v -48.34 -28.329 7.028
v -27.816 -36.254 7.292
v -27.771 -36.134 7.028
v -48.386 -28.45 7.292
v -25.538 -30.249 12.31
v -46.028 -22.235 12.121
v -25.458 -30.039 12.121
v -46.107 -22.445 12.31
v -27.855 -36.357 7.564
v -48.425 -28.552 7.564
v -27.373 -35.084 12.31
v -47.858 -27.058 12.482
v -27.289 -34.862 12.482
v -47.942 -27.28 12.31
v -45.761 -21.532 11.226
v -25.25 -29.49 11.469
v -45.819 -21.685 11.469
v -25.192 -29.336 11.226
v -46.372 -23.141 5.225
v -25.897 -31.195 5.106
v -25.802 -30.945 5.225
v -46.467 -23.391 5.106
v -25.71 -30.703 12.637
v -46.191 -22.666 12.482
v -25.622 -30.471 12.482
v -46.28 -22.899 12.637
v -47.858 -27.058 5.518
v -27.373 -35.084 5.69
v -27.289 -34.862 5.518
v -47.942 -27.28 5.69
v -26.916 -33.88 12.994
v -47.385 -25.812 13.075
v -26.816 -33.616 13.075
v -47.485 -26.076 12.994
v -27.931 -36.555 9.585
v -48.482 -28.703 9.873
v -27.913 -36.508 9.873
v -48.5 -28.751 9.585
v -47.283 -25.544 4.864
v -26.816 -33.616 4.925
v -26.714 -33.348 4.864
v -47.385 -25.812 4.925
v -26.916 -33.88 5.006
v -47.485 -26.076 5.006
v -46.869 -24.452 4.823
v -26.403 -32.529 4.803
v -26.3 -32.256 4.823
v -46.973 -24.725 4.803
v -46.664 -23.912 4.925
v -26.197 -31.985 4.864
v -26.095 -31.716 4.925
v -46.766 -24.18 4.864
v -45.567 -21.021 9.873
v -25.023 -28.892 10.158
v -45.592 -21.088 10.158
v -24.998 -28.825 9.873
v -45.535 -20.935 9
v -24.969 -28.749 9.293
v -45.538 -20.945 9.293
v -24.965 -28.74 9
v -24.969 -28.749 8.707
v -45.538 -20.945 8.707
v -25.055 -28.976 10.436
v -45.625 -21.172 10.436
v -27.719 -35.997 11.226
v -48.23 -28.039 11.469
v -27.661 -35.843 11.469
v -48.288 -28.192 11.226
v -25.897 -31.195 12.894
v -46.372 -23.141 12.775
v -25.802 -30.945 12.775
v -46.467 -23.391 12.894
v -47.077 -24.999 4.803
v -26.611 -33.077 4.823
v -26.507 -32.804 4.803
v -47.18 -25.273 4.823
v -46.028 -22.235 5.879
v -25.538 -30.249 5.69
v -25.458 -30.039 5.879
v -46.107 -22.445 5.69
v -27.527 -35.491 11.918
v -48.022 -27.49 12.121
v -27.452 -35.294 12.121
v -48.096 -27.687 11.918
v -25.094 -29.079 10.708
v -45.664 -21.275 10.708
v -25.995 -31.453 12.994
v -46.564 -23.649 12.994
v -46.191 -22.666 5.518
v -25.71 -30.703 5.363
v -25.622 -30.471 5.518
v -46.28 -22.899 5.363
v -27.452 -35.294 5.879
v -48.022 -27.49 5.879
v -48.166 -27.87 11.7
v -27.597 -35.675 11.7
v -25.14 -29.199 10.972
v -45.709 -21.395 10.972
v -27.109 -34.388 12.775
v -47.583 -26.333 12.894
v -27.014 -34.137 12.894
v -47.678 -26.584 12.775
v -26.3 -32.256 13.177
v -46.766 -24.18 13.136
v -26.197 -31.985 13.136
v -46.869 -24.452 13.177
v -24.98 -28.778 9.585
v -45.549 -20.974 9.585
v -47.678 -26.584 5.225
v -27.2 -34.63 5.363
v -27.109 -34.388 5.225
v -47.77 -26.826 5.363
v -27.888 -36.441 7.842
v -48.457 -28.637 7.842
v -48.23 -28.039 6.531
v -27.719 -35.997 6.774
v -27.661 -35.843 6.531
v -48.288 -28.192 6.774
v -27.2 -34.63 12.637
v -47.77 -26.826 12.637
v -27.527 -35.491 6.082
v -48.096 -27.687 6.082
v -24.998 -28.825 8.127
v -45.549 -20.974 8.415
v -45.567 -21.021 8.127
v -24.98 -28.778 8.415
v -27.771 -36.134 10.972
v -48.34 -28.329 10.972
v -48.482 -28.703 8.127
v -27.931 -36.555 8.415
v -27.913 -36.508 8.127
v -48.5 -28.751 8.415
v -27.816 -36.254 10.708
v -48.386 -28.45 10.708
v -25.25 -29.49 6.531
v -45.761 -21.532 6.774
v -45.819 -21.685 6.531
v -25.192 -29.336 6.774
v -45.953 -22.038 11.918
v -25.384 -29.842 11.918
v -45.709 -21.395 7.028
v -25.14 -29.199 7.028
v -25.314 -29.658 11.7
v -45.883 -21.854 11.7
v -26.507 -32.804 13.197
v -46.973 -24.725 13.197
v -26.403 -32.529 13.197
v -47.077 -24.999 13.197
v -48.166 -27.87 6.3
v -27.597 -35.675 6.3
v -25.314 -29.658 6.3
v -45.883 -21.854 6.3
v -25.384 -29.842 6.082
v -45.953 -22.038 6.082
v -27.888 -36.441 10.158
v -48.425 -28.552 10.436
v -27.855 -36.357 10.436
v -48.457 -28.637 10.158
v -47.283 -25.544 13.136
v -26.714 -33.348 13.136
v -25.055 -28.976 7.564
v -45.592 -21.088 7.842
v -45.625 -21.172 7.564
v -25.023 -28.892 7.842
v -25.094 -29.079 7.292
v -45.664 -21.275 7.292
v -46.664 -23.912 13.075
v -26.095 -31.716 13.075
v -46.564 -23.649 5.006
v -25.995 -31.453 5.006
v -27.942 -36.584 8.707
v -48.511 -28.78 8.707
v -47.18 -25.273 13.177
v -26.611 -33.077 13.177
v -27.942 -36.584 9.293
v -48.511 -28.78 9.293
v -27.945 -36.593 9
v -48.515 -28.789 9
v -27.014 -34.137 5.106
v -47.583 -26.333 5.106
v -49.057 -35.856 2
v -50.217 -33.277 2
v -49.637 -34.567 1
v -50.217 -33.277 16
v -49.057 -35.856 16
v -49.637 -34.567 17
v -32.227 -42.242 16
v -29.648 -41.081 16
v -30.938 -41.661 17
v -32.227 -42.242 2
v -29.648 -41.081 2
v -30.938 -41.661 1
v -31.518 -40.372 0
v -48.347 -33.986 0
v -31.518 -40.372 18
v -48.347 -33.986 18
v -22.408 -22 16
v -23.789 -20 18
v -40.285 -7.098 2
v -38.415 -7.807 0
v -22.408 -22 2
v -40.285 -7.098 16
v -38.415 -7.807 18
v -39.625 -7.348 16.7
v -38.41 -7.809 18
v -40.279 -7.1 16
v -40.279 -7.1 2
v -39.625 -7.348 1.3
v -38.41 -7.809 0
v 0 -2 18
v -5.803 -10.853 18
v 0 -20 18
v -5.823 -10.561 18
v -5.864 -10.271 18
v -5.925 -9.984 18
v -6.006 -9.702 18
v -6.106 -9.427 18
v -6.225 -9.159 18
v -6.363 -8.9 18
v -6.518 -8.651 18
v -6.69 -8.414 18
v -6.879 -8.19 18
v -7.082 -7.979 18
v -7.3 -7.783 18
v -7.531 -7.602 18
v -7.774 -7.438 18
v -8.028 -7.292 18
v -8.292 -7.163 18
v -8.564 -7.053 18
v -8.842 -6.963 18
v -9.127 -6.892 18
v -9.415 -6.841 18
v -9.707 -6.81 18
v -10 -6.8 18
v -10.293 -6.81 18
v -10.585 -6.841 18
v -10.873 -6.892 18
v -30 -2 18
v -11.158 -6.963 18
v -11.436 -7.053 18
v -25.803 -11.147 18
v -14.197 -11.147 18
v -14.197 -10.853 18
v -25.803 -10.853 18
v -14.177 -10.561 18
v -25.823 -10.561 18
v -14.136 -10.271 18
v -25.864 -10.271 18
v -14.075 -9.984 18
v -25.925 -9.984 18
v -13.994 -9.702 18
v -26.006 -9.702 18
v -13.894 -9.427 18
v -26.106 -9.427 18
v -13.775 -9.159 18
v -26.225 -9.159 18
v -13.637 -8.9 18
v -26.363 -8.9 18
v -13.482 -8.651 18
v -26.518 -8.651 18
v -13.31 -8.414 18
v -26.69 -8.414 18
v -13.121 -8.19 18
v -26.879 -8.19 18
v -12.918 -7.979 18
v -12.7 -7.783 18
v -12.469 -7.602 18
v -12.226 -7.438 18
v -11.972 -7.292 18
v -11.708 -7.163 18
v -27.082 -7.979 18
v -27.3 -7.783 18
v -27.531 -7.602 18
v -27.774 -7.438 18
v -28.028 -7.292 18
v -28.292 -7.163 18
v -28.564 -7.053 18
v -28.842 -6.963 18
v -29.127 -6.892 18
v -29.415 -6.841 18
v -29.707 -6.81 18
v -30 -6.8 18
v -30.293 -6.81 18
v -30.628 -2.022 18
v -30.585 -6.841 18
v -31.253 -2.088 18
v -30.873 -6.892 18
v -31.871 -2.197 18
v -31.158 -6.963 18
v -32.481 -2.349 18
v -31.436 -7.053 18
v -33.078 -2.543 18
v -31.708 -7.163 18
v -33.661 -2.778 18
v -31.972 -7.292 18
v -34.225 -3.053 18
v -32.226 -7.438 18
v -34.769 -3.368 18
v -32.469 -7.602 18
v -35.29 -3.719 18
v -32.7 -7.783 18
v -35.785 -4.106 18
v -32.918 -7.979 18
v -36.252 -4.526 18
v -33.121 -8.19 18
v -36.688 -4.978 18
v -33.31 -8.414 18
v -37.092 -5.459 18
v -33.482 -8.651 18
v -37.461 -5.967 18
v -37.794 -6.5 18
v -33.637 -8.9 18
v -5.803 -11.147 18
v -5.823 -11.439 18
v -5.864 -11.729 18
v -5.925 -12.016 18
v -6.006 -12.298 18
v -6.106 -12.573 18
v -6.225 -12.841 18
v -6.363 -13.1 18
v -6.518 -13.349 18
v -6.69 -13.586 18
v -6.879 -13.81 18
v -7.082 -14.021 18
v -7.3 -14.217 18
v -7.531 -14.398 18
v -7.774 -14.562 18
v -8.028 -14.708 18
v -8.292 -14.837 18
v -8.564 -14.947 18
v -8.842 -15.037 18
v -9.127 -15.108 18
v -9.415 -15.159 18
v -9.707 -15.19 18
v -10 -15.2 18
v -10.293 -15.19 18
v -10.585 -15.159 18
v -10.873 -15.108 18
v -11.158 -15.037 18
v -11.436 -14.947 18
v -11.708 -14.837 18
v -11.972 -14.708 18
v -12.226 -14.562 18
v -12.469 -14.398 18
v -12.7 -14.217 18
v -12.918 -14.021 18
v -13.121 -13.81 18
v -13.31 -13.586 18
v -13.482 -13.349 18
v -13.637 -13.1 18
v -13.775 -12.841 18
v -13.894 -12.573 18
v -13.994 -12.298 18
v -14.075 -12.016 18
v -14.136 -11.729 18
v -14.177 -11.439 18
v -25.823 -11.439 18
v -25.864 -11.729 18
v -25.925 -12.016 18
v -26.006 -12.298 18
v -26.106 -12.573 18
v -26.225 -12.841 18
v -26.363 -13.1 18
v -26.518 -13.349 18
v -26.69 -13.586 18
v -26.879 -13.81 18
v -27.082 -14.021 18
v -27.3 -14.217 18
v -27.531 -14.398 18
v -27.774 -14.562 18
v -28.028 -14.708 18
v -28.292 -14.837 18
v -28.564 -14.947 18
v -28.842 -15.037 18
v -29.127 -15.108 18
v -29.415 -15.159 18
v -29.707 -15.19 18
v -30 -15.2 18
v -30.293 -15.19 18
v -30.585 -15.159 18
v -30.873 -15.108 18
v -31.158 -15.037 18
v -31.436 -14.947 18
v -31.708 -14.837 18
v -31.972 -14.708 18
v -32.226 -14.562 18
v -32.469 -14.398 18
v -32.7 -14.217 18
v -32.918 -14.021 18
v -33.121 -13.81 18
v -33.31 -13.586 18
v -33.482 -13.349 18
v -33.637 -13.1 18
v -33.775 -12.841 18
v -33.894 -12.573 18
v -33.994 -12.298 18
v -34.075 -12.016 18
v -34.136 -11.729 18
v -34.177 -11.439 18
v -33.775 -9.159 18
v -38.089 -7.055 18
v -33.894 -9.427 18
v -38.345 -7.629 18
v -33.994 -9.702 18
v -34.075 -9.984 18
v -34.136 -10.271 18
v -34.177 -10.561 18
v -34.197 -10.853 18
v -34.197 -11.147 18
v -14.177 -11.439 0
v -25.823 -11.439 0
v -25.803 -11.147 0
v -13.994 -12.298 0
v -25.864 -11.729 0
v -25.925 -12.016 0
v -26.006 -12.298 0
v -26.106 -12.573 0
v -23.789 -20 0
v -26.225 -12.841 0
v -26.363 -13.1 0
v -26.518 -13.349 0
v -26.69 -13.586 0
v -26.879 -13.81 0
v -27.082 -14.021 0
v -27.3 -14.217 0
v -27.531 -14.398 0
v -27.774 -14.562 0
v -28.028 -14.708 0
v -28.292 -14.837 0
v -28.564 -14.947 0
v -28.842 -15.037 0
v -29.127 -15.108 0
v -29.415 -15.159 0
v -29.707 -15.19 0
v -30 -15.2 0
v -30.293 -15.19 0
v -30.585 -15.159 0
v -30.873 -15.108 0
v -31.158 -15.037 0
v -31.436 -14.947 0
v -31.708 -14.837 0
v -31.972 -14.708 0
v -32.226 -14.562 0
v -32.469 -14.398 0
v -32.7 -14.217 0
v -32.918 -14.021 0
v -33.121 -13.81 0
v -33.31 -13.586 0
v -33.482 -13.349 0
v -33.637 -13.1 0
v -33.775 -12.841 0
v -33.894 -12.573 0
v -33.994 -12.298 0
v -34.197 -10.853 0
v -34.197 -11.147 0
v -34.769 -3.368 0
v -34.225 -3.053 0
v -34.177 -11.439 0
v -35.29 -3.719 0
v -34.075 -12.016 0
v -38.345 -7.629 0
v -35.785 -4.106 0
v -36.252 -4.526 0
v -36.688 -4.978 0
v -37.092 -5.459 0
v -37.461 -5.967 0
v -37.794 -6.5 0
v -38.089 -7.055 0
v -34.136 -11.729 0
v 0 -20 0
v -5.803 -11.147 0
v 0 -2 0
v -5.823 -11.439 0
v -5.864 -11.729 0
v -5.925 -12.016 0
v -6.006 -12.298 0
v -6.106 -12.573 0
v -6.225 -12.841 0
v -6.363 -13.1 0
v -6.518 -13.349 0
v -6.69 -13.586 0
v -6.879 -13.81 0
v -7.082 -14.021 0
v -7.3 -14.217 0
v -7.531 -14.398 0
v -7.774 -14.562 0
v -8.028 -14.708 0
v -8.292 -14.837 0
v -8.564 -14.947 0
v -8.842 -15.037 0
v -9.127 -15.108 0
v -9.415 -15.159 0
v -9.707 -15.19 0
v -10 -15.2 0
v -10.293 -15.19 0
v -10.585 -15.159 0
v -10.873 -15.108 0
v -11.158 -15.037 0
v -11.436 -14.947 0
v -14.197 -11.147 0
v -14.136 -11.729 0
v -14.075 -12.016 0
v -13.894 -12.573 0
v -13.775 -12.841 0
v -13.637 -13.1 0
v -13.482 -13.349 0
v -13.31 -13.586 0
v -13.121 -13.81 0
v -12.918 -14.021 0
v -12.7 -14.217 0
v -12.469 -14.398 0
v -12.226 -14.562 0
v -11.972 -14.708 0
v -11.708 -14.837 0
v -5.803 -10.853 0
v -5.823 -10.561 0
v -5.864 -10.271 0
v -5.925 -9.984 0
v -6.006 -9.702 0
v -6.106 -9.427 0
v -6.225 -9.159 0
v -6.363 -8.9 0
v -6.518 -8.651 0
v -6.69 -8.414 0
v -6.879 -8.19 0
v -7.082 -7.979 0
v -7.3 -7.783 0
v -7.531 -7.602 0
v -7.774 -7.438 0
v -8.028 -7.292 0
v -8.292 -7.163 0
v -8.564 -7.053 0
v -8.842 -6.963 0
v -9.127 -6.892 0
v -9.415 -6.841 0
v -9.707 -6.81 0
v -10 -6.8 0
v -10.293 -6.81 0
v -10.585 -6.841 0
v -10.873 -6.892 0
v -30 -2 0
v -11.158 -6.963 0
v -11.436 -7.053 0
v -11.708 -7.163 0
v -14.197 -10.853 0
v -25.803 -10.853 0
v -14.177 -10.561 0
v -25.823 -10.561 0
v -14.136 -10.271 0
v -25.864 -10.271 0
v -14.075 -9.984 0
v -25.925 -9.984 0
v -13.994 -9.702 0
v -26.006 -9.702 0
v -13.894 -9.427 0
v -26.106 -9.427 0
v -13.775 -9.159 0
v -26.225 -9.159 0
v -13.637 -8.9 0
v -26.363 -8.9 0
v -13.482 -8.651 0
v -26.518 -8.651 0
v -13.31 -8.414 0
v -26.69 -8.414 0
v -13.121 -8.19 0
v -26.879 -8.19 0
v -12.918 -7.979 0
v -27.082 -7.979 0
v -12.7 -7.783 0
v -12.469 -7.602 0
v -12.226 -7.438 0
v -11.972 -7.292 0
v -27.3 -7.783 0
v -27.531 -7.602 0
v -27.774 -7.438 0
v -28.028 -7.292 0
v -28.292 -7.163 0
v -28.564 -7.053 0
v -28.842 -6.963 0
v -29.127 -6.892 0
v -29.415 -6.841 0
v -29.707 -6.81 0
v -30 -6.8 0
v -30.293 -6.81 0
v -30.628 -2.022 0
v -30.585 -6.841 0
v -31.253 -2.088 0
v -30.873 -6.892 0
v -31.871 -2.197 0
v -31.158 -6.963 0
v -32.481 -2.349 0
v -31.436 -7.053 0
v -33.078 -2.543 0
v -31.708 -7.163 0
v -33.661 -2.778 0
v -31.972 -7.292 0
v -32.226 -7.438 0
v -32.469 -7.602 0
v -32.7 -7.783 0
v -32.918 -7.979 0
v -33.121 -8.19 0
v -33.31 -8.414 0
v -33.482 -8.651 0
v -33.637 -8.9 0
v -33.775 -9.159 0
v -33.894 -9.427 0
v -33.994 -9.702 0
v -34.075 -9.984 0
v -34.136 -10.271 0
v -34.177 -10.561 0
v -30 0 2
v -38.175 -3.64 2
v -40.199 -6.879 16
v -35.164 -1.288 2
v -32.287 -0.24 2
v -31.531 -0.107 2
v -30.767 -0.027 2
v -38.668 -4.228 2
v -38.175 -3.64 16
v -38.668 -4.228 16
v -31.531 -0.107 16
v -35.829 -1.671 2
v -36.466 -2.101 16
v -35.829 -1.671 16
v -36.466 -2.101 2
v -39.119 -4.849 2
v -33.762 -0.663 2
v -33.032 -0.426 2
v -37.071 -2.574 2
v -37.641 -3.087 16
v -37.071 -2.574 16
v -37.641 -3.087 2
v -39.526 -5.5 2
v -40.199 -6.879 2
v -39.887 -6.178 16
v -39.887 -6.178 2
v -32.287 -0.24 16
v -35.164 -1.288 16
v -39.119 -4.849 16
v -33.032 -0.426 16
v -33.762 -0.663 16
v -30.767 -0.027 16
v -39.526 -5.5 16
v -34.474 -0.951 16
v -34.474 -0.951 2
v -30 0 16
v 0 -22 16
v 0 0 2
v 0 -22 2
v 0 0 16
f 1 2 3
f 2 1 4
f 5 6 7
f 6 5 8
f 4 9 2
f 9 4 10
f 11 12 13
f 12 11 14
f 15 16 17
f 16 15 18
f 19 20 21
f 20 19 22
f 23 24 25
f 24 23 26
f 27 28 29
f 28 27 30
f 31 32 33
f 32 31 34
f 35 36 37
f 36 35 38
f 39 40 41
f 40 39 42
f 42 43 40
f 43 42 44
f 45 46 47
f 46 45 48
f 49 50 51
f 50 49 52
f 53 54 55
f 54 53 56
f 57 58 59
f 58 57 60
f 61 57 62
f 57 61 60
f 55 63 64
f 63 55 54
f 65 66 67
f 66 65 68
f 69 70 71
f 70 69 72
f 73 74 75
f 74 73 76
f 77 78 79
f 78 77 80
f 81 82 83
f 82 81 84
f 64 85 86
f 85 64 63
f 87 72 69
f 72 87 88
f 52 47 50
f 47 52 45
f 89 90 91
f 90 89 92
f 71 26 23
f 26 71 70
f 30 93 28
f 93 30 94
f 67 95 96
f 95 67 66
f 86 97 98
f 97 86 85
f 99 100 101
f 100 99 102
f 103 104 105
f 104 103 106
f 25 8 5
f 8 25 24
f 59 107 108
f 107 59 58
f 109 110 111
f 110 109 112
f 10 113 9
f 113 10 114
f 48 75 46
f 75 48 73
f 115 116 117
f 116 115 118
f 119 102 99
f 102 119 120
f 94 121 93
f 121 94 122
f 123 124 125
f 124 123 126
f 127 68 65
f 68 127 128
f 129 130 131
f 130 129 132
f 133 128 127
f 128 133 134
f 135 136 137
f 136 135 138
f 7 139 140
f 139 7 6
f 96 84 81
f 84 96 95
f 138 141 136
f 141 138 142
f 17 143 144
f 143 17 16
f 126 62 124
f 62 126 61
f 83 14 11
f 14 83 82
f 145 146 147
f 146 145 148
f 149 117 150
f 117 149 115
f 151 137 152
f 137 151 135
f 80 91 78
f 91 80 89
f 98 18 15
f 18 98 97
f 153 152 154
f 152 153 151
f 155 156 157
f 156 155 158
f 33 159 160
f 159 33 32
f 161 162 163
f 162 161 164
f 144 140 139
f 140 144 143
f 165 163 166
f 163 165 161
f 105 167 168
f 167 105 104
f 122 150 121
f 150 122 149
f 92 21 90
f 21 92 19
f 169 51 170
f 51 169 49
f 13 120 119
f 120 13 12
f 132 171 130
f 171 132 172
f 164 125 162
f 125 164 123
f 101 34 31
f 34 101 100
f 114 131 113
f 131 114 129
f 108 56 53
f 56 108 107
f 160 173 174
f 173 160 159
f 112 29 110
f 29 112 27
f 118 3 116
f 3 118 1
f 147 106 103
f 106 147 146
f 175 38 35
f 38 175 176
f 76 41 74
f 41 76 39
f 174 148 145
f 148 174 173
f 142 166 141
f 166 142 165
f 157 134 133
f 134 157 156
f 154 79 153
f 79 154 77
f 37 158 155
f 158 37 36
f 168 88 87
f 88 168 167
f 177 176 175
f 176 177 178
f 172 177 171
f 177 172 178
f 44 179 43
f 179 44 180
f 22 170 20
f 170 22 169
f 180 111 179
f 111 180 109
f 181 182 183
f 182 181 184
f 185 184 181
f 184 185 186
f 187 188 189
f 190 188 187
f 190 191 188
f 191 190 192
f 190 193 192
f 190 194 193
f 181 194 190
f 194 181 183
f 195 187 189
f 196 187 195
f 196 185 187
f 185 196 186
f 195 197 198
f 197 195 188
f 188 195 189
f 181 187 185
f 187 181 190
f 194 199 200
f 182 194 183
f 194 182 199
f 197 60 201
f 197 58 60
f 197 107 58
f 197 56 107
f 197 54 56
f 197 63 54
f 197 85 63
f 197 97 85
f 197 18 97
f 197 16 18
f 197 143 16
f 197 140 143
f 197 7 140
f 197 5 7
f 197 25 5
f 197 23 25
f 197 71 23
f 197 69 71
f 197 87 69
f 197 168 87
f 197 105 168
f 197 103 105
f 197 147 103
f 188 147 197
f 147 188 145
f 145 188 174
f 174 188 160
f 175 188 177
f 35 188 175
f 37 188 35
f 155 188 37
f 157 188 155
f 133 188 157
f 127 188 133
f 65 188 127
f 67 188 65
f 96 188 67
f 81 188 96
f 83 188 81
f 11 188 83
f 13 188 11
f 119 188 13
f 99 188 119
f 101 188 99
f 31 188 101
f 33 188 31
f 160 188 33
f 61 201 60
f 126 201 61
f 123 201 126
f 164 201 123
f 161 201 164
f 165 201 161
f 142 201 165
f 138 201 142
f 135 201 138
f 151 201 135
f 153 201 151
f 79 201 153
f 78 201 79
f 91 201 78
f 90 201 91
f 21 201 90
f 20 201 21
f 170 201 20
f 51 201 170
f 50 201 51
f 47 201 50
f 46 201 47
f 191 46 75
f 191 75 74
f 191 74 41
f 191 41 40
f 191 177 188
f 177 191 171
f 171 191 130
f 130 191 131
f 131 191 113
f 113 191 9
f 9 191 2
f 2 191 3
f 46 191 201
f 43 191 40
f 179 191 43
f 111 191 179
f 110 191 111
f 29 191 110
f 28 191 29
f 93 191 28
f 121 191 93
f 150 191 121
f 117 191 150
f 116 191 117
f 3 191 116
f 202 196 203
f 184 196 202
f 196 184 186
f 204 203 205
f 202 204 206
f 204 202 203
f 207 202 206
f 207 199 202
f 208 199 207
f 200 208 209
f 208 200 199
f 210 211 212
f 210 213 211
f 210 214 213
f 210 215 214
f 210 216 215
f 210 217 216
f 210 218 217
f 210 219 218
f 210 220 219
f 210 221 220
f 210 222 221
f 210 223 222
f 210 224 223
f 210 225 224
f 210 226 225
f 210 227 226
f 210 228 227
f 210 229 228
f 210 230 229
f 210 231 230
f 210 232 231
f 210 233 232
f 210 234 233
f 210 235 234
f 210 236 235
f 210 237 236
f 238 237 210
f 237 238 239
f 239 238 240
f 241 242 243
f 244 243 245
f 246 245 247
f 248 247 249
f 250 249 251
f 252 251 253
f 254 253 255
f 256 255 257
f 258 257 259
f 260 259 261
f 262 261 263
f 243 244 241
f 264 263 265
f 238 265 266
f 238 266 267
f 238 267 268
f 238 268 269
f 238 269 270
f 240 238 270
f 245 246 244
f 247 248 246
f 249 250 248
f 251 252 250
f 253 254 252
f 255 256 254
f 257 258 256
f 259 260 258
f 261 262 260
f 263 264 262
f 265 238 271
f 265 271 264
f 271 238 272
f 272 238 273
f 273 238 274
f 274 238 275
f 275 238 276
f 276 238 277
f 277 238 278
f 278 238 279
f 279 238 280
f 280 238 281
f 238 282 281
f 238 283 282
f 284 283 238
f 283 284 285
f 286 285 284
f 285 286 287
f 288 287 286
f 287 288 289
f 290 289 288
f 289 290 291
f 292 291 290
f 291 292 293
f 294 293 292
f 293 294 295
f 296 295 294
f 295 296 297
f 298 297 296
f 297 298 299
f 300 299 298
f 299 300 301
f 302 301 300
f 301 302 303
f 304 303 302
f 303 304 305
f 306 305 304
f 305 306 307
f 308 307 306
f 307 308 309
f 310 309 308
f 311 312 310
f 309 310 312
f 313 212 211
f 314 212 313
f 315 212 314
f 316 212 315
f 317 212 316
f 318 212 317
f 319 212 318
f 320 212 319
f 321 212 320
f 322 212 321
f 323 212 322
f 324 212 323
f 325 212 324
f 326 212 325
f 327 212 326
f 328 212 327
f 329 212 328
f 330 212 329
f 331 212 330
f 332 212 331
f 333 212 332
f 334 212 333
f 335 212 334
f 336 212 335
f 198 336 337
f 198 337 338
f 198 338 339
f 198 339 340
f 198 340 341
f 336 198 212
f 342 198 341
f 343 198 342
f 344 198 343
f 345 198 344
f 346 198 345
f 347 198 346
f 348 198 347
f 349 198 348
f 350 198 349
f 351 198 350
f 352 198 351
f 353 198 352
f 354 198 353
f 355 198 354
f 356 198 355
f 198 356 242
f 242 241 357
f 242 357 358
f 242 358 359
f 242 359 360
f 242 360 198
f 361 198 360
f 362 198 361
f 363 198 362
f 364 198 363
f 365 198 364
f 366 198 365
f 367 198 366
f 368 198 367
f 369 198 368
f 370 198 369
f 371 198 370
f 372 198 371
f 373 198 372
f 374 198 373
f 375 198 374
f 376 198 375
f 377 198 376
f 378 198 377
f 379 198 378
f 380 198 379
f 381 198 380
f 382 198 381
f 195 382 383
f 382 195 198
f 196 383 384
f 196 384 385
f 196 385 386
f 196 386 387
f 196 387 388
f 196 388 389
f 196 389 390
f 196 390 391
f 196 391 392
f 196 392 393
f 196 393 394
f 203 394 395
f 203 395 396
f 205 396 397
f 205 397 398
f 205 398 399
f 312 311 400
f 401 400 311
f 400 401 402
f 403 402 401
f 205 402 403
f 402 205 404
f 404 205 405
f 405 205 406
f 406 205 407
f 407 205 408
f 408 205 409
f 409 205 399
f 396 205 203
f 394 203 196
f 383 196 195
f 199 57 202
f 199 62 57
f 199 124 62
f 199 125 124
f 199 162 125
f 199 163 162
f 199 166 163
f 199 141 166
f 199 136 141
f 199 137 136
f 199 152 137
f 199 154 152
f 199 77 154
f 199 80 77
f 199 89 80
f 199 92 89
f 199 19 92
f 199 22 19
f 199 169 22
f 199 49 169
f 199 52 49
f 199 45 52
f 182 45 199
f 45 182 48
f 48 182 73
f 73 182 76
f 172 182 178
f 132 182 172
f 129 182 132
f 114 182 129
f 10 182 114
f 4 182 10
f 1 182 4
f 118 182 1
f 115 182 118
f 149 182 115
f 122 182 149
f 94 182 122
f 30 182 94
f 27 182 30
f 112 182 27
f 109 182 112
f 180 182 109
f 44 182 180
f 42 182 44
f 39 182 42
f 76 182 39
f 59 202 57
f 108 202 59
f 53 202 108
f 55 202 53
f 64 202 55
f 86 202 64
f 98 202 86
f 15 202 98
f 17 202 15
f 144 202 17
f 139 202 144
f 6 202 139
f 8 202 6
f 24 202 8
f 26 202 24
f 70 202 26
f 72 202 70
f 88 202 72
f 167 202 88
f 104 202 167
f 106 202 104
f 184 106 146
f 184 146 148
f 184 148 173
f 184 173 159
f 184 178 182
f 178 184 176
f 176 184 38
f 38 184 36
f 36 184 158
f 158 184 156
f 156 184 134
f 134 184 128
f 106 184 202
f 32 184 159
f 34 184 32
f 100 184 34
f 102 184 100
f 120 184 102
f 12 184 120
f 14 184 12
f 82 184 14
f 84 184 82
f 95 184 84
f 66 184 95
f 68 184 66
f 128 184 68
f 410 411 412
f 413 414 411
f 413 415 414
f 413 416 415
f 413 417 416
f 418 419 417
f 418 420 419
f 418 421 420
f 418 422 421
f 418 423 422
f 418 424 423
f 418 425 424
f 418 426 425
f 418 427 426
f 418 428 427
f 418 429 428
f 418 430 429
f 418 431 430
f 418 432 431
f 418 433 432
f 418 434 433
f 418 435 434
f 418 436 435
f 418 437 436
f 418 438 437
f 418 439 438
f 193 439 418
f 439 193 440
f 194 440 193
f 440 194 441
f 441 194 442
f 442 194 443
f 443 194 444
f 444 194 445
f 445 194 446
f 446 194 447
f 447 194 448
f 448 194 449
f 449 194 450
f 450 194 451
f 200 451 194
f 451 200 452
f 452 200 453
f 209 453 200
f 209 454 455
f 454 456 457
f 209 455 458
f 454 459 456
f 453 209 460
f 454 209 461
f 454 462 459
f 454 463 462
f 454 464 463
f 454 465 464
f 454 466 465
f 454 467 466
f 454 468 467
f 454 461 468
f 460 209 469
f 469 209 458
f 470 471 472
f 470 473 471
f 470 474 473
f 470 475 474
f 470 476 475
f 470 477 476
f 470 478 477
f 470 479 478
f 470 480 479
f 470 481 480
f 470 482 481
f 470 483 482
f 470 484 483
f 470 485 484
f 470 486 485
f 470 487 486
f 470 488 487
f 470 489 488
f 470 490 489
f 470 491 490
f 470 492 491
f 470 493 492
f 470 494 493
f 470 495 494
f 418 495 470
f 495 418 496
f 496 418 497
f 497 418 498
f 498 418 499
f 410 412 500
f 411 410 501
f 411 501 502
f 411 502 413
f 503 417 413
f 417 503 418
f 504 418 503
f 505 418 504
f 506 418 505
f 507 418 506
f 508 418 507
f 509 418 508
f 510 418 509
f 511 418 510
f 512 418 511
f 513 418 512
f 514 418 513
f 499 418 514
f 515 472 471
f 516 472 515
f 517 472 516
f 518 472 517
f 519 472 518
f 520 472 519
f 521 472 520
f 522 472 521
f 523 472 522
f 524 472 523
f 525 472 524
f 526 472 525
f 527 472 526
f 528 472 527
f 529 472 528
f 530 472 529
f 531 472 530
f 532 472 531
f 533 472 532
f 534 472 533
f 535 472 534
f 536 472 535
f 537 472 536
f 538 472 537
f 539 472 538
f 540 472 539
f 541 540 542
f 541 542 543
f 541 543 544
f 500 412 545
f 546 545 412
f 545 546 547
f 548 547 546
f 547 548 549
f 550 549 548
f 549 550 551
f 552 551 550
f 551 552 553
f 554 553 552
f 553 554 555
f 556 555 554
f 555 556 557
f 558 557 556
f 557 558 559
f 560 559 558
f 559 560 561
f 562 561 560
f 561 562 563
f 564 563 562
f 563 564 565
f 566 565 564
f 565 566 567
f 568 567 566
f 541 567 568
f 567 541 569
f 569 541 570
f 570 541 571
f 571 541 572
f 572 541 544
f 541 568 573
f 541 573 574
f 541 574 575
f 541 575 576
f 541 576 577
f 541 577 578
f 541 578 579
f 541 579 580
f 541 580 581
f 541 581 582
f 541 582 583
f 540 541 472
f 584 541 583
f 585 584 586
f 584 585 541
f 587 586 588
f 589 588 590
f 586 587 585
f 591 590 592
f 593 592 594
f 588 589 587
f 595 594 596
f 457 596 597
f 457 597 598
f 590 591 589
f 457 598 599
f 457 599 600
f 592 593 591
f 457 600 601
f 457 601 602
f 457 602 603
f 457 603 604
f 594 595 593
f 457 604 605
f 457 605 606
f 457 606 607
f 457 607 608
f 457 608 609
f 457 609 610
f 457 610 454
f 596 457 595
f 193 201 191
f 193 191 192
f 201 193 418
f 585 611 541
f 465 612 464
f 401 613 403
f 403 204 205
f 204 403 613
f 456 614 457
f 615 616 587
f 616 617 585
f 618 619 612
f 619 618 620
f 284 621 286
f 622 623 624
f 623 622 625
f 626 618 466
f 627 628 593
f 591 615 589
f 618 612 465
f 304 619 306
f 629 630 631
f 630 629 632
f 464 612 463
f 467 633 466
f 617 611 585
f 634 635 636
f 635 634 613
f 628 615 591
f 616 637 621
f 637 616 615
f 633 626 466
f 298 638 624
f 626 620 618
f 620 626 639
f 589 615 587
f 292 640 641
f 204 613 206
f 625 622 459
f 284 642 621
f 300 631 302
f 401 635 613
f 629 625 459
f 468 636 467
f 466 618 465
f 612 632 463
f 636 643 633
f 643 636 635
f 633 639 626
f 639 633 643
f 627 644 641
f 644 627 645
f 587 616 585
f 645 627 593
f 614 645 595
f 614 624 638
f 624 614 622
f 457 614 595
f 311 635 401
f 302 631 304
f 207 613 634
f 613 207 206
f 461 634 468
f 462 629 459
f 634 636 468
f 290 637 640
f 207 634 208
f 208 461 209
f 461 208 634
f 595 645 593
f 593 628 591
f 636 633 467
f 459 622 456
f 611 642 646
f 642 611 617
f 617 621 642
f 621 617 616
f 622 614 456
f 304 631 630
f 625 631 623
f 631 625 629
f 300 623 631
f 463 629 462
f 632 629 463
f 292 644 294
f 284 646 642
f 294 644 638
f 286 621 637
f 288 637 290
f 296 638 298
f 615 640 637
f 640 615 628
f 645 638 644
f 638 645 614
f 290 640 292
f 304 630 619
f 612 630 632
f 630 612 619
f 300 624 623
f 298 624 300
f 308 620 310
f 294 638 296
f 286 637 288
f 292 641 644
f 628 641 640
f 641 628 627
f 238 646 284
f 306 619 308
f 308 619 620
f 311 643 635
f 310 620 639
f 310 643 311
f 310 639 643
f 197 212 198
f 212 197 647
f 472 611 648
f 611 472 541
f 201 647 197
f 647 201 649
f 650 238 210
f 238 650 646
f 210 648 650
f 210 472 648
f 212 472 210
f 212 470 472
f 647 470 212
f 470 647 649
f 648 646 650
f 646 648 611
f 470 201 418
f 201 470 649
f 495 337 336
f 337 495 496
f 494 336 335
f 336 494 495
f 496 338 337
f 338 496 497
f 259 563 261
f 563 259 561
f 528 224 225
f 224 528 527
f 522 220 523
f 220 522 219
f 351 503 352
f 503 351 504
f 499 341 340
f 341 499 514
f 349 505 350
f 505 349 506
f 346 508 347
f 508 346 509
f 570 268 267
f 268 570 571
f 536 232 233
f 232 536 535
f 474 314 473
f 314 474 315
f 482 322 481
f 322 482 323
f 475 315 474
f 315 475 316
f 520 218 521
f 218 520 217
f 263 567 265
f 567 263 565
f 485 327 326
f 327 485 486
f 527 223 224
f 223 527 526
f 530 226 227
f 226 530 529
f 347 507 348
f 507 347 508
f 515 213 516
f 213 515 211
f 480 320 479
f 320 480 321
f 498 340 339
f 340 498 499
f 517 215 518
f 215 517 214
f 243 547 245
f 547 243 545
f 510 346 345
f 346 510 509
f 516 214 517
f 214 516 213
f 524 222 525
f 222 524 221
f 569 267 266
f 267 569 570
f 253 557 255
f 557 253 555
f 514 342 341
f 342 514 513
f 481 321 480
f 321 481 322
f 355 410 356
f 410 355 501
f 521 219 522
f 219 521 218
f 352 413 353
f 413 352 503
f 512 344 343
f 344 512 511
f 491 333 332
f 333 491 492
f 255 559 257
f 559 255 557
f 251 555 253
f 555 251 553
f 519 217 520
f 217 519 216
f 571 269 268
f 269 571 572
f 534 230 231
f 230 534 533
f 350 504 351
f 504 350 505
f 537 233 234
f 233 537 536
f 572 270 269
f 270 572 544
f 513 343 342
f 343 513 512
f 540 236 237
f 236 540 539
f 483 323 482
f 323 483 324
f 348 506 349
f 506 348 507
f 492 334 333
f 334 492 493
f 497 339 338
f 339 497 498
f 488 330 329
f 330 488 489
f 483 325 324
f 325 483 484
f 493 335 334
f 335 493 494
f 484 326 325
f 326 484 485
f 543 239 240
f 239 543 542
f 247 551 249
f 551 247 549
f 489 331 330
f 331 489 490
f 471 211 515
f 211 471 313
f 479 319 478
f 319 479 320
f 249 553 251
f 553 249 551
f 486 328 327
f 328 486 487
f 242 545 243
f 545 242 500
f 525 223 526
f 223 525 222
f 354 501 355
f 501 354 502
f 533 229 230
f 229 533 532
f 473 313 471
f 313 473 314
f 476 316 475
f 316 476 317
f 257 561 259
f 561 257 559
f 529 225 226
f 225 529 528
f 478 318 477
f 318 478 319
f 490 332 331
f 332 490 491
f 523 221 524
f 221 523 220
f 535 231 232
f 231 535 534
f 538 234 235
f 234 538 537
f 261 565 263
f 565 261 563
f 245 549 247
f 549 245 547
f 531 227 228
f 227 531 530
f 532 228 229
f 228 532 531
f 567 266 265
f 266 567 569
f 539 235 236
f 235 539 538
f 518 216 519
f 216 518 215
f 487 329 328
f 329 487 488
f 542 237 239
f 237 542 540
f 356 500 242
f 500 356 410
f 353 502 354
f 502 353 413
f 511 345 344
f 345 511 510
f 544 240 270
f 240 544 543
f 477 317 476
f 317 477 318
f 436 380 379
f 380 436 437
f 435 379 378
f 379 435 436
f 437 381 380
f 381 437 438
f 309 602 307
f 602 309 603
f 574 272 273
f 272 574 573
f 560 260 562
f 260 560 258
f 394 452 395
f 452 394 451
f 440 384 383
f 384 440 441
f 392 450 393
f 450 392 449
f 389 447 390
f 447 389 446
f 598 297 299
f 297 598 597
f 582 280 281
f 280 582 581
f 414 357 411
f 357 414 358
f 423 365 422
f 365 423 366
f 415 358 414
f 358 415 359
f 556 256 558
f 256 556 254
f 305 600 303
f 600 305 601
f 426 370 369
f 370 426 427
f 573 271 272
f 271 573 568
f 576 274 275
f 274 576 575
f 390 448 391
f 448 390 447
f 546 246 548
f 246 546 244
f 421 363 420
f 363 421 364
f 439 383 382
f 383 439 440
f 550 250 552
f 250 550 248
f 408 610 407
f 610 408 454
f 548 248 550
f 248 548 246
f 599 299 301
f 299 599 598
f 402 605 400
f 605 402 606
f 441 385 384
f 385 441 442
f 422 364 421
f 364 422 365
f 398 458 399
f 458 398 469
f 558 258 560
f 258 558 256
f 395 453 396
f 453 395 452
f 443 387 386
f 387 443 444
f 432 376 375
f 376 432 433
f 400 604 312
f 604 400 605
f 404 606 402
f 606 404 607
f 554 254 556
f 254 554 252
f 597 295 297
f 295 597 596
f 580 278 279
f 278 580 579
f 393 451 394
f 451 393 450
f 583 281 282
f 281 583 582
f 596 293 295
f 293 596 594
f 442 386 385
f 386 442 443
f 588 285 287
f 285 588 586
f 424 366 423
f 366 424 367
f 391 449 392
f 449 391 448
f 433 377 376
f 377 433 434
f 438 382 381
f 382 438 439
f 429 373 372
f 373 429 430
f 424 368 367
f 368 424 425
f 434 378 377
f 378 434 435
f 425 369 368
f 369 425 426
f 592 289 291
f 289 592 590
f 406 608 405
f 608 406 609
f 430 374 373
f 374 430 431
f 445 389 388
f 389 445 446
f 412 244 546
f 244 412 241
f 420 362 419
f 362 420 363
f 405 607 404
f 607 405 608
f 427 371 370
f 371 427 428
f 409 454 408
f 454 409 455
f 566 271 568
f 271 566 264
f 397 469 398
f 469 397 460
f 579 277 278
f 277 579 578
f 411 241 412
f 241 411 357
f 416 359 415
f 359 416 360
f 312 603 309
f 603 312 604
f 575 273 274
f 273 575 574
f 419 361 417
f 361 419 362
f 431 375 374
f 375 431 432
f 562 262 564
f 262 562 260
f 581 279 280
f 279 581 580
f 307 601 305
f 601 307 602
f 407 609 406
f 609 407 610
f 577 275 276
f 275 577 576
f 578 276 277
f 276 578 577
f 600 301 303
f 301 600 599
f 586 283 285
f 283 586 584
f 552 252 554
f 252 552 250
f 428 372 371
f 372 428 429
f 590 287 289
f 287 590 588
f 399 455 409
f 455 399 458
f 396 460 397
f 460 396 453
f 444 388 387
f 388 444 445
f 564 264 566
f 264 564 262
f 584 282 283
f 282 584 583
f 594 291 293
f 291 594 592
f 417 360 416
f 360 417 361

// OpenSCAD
//Supports for Prusa i3 printer.
//By Jkk79.

//
showAssembly=0;//[1:Yes,0:No]
//
part="leg";//[top:Top holder part,leg:Leg part]

//distance between the aluminium frame and the center of the threaded rods at the end of the Y-axis. Mine is 119mm. Adjust this if yours is something else.
frameDistance=119;
//The diameter of the new threaded support rods, M8 default. You can use a smaller one, larger won't fit, and even M5 would be strong enough.
supportRodDiameter=8;
/*[Leg part]*/
//Cut edges off of the leg part. 0=no cuts, no overhang at corners, easier to print.
legChamfer=2;//[0,1,2,3,4]
/*[Top part]*/
//The thickness of the top holder part. You need to replace the M3 screws with at least this much longer M3 screws.
topHolderThickness=6;
//Cut the top holder corners, 0=no cut.
topHolderCorners=5;
//The alignment the top holder should be printed at. Notice: bottom will be cut differently and different parts are at right angle to the print bed.
topHolderPrintAlign=1;//[1:Upside down,2:Right way up]
//The height of the top holder part.  Set to at least 18 if printing the holder right way up to avoid M8 washer intersecting with M3 nut. Also if your Y-axis's end is considerably farther off from the frame than the default, you may need to increase the value.
topHolderHeight=16;//[16:22]

//Adjust if you think you need to.
washerCutDepth=7;//[5:11]


/*[Settings you shouldn't need to change]*/
//The diameter of the threaded rods at the end of the Y-axis. M8 default, so 8mm. You need to swap these to ones that are 370mm long.
yEndRodDiameter=8;
//the width of the leg part.
legWidth=22;
//The thickness of the leg part.
legThickness=18;
//The lower Y-axis end rod center distance from ground.
holeDistance1=10;
//The upper Y-axis end rod center distance from ground.
holeDistance2=30;
//Height of the frame, should be 370mm.
frameHeight=370;
//Screw size. default is M3.
topHolderScrewSize=3;


/*[Hidden]*/
$fn=90;
//The width of the top holder part. 40. For now changing this only breaks things.
topHolderWidth=40;
//Calculated angle of the new support rod.
angle=atan2(frameHeight-holeDistance2,frameDistance+holeDistance2-holeDistance1-10);
//Calculated length of the new support rod.
supportRodLength=sqrt(pow(frameHeight-holeDistance2,2)+pow(frameDistance+holeDistance2-holeDistance1-10,2))+legWidth;
//convexity setting, just so it's easier to switch. 
conv=8;

echo("The angle of the rods: ",angle);
echo("The new support rods need to be at least ",supportRodLength,"mm long");
echo("would be nice to get an echo support for customizer.");
print_part();




if(showAssembly==1){  
   translate([-60,-185,0])%assembly();
}else{}


module print_part(){
    if(part=="top"){
        if(topHolderPrintAlign==1){
            translate([0,0,topHolderHeight])rotate([0,180,0])topHolder();//align 1
        }
        else{
            translate([0,40,0])rotate([0,90-angle,180])topHolder(); //align 2
        }
    }
    else if(part=="leg"){
        rotate([90,0,-90])leg();
    }
}




module leg(){

    difference(){
        union(){
            translate([legWidth/2,legThickness,holeDistance2])rotate([90,0,0])legBend();
            legPart();
            translate([legWidth/2,0,holeDistance2])rotate([0,angle,0]){
                translate([-legWidth/2,0,legWidth/2-legWidth/2]){
                    difference(){
                        legPart();
                        translate([0,0,-legWidth/2]){
                        translate([-1,legThickness/2,holeDistance2])rotate([0,90,0])cylinder(legWidth+2,supportRodDiameter/2+0.2,supportRodDiameter/2+0.2);
                        translate([0,0,holeDistance2+legWidth/2-legChamfer])rotate([0,-45,0])cube([legChamfer*2,20,legChamfer*2]);
                        translate([legWidth,0,holeDistance2+legWidth/2-legChamfer])rotate([0,-45,0])cube([legChamfer*2,20,legChamfer*2]);
                        translate([0,0,holeDistance2+legWidth/2-legChamfer])rotate([45,0,0])cube([legWidth,legChamfer*2,legChamfer*2]);
                        translate([0,legThickness,holeDistance2+legWidth/2-legChamfer])rotate([45,0,0])cube([legWidth,legChamfer*2,legChamfer*2]);
                        }
                    }
                }
            }
        }
        translate([legWidth/2,legThickness+1,holeDistance1])rotate([90,0,0])cylinder(legThickness+2,yEndRodDiameter/2+0.2,yEndRodDiameter/2+0.2);
        translate([legWidth/2,legThickness+1,holeDistance2])rotate([90,0,0])cylinder(legThickness+2,yEndRodDiameter/2+0.2,yEndRodDiameter/2+0.2);
    }
    //translate([legWidth,20,30-tan(angle/2)*legWidth/2])rotate([90,0,0])cylinder(30,2,2); //inner bend intersection.
}

module legPart(){
    linear_extrude(height=holeDistance2,convexity=conv)polygon(points=[[legChamfer,0],[legWidth-legChamfer,0],[legWidth,legChamfer],[legWidth,legThickness-legChamfer],[legWidth-legChamfer,legThickness],[legChamfer,legThickness],[0,legThickness-legChamfer],[0,legChamfer]]);
}
    
module legBend(){    
    difference(){
        rotate_extrude(convexity=conv)polygon(points=[[0,0],[(legWidth/2)-legChamfer,0],[legWidth/2,legChamfer],[legWidth/2,legThickness-legChamfer],[legWidth/2-legChamfer,legThickness],[0,legThickness]]);
    }
}


module topHolder(){

    union(){
        difference(){
            union(){
                //hull(){
                    difference(){
                        cube([topHolderThickness,topHolderWidth,topHolderHeight]);
                        translate([-1,0,topHolderHeight-topHolderCorners])rotate([45,0,0])cube([20,20,20]);   
                        translate([0,topHolderWidth,0])mirror([0,1,0])translate([-1,0,topHolderHeight-topHolderCorners])rotate([45,0,0])cube([20,20,20]);   

            }
                    translate([0,20,topHolderHeight])mirror([0,0,1])hull(){
                    rotate([0,90-angle,0])translate([10,0,0])cylinder(25,10,10);
                    rotate([0,0,0])translate([0,0,0])cylinder(25,10,10);
                    }
               // }//hull
            }
            translate([0,20,topHolderHeight])mirror([0,0,1])rotate([0,90-angle,0])translate([10,0,-5])cylinder(30,supportRodDiameter/2+0.2,supportRodDiameter/2+0.2);             
            translate([0,20,topHolderHeight])mirror([0,0,1])rotate([0,90-angle,0])translate([10,0,0])cylinder(washerCutDepth,9.2,9.2);
                
            translate([-1,10,topHolderHeight-10])rotate([0,90,0])cylinder(20,topHolderScrewSize/2+0.2,topHolderScrewSize/2+0.2);
            translate([-1,30,topHolderHeight-10])rotate([0,90,0])cylinder(20,topHolderScrewSize/2+0.2,topHolderScrewSize/2+0.2);
            hull(){
                translate([topHolderThickness,10,topHolderHeight-10])rotate([0,90,0])cylinder(20,topHolderScrewSize+1.5,topHolderScrewSize+1.5);
                translate([topHolderThickness,10,0])rotate([0,90,0])cylinder(20,topHolderScrewSize+1.5,topHolderScrewSize+1.5);
                translate([topHolderThickness,0,topHolderHeight-10])rotate([0,90,0])cylinder(20,topHolderScrewSize+1.5,topHolderScrewSize+1.5);
                translate([topHolderThickness,0,0])rotate([0,90,0])cylinder(20,topHolderScrewSize+1.5,topHolderScrewSize+1.5);
                
            }
            hull(){
                translate([topHolderThickness,30,topHolderHeight-10])rotate([0,90,0])cylinder(20,topHolderScrewSize+1.5,topHolderScrewSize+1.5);
                translate([topHolderThickness,30,0])rotate([0,90,0])cylinder(20,topHolderScrewSize+1.5,topHolderScrewSize+1.5);
                translate([topHolderThickness,40,topHolderHeight-10])rotate([0,90,0])cylinder(20,topHolderScrewSize+1.5,topHolderScrewSize+1.5);
                translate([topHolderThickness,40,0])rotate([0,90,0])cylinder(20,topHolderScrewSize+1.5,topHolderScrewSize+1.5);
            }
           
           if(topHolderPrintAlign==1){
               translate([topHolderThickness,-1,0])rotate([0,-90+angle,0])mirror([0,0,1])cube([40,topHolderWidth+2,40]);//bottom cutter
              translate([-1,0,-20])rotate([0,0,0])cube([40,topHolderWidth,20]);//bottom cutter 2
            }
            else{
               translate([0,-1,0])rotate([0,-90+angle,0])mirror([0,0,1])translate([-5,0,0])cube([40,topHolderWidth+2,40]); //alternative bottom cutter
            }

            translate([-10,0,topHolderHeight])rotate([0,0,0])cube([40,40,20]);//top cutter
            
            translate([-40,0,-20])rotate([0,0,0])cube([40,40,60]);//back cutter
            

        }
    }
}


module assembly(){
    color("lime")translate([0,0,frameHeight-topHolderHeight])rotate([0,0,0])topHolder();
    color("lime")translate([0,370-topHolderWidth,frameHeight-topHolderHeight])rotate([0,0,0])topHolder();
    color("lime")translate([frameDistance-legWidth/2,topHolderWidth/2-legThickness/2,0])rotate([0,0,0])leg(); 
    color("lime")translate([frameDistance-legWidth/2,370-topHolderWidth/2-legThickness/2,0])rotate([0,0,0])leg();

    %difference(){
        translate([-6,0,0])cube([6,370,frameHeight]);
        translate([-7,55,35])cube([8,370-55-55,frameHeight-40-35]);
        }
    color("yellow")translate([0,topHolderWidth/2,frameHeight])mirror([0,0,0])rotate([0,90+angle,0])translate([-10,0,0])cylinder(supportRodLength,supportRodDiameter/2 ,supportRodDiameter/2);
    color("yellow")translate([0,370-topHolderWidth/2,frameHeight])mirror([0,0,0])rotate([0,90+angle,0])translate([-10,0,0])cylinder(supportRodLength,4,4); //m8 rod
    color("khaki")translate([frameDistance,0,holeDistance1])rotate([-90,0,0])cylinder(370,yEndRodDiameter/2,yEndRodDiameter/2);
    color("khaki")translate([frameDistance,0,holeDistance2])rotate([-90,0,0])cylinder(370,yEndRodDiameter/2,yEndRodDiameter/2);
    %translate([frameDistance-legWidth/2,100-legThickness/2,0])cube([legWidth,legThickness,50]);
    %translate([frameDistance-legWidth/2,370-100-legThickness/2,0])cube([legWidth,legThickness,50]);
    
    %translate([frameDistance-335-legWidth/2,100-legThickness/2,0])cube([legWidth,legThickness,50]);
    %translate([frameDistance-335-legWidth/2,370-100-legThickness/2,0])cube([legWidth,legThickness,50]);
    %translate([frameDistance-335,82.5,holeDistance1])rotate([-90,0,0])cylinder(205,4,4);
    %translate([frameDistance-335,82.5,holeDistance2])rotate([-90,0,0])cylinder(205,4,4);
        
    %translate([frameDistance+21,100,holeDistance2-holeDistance1])rotate([0,-90,0])cylinder(380,5,5);
    %translate([frameDistance+21,370-100,holeDistance2-holeDistance1])rotate([0,-90,0])cylinder(380,5,5);
        
    %translate([frameDistance+8,100,48])rotate([0,-90,0])cylinder(350,4,4);
    %translate([frameDistance+8,370-100,48])rotate([0,-90,0])cylinder(350,4,4);
        
}
